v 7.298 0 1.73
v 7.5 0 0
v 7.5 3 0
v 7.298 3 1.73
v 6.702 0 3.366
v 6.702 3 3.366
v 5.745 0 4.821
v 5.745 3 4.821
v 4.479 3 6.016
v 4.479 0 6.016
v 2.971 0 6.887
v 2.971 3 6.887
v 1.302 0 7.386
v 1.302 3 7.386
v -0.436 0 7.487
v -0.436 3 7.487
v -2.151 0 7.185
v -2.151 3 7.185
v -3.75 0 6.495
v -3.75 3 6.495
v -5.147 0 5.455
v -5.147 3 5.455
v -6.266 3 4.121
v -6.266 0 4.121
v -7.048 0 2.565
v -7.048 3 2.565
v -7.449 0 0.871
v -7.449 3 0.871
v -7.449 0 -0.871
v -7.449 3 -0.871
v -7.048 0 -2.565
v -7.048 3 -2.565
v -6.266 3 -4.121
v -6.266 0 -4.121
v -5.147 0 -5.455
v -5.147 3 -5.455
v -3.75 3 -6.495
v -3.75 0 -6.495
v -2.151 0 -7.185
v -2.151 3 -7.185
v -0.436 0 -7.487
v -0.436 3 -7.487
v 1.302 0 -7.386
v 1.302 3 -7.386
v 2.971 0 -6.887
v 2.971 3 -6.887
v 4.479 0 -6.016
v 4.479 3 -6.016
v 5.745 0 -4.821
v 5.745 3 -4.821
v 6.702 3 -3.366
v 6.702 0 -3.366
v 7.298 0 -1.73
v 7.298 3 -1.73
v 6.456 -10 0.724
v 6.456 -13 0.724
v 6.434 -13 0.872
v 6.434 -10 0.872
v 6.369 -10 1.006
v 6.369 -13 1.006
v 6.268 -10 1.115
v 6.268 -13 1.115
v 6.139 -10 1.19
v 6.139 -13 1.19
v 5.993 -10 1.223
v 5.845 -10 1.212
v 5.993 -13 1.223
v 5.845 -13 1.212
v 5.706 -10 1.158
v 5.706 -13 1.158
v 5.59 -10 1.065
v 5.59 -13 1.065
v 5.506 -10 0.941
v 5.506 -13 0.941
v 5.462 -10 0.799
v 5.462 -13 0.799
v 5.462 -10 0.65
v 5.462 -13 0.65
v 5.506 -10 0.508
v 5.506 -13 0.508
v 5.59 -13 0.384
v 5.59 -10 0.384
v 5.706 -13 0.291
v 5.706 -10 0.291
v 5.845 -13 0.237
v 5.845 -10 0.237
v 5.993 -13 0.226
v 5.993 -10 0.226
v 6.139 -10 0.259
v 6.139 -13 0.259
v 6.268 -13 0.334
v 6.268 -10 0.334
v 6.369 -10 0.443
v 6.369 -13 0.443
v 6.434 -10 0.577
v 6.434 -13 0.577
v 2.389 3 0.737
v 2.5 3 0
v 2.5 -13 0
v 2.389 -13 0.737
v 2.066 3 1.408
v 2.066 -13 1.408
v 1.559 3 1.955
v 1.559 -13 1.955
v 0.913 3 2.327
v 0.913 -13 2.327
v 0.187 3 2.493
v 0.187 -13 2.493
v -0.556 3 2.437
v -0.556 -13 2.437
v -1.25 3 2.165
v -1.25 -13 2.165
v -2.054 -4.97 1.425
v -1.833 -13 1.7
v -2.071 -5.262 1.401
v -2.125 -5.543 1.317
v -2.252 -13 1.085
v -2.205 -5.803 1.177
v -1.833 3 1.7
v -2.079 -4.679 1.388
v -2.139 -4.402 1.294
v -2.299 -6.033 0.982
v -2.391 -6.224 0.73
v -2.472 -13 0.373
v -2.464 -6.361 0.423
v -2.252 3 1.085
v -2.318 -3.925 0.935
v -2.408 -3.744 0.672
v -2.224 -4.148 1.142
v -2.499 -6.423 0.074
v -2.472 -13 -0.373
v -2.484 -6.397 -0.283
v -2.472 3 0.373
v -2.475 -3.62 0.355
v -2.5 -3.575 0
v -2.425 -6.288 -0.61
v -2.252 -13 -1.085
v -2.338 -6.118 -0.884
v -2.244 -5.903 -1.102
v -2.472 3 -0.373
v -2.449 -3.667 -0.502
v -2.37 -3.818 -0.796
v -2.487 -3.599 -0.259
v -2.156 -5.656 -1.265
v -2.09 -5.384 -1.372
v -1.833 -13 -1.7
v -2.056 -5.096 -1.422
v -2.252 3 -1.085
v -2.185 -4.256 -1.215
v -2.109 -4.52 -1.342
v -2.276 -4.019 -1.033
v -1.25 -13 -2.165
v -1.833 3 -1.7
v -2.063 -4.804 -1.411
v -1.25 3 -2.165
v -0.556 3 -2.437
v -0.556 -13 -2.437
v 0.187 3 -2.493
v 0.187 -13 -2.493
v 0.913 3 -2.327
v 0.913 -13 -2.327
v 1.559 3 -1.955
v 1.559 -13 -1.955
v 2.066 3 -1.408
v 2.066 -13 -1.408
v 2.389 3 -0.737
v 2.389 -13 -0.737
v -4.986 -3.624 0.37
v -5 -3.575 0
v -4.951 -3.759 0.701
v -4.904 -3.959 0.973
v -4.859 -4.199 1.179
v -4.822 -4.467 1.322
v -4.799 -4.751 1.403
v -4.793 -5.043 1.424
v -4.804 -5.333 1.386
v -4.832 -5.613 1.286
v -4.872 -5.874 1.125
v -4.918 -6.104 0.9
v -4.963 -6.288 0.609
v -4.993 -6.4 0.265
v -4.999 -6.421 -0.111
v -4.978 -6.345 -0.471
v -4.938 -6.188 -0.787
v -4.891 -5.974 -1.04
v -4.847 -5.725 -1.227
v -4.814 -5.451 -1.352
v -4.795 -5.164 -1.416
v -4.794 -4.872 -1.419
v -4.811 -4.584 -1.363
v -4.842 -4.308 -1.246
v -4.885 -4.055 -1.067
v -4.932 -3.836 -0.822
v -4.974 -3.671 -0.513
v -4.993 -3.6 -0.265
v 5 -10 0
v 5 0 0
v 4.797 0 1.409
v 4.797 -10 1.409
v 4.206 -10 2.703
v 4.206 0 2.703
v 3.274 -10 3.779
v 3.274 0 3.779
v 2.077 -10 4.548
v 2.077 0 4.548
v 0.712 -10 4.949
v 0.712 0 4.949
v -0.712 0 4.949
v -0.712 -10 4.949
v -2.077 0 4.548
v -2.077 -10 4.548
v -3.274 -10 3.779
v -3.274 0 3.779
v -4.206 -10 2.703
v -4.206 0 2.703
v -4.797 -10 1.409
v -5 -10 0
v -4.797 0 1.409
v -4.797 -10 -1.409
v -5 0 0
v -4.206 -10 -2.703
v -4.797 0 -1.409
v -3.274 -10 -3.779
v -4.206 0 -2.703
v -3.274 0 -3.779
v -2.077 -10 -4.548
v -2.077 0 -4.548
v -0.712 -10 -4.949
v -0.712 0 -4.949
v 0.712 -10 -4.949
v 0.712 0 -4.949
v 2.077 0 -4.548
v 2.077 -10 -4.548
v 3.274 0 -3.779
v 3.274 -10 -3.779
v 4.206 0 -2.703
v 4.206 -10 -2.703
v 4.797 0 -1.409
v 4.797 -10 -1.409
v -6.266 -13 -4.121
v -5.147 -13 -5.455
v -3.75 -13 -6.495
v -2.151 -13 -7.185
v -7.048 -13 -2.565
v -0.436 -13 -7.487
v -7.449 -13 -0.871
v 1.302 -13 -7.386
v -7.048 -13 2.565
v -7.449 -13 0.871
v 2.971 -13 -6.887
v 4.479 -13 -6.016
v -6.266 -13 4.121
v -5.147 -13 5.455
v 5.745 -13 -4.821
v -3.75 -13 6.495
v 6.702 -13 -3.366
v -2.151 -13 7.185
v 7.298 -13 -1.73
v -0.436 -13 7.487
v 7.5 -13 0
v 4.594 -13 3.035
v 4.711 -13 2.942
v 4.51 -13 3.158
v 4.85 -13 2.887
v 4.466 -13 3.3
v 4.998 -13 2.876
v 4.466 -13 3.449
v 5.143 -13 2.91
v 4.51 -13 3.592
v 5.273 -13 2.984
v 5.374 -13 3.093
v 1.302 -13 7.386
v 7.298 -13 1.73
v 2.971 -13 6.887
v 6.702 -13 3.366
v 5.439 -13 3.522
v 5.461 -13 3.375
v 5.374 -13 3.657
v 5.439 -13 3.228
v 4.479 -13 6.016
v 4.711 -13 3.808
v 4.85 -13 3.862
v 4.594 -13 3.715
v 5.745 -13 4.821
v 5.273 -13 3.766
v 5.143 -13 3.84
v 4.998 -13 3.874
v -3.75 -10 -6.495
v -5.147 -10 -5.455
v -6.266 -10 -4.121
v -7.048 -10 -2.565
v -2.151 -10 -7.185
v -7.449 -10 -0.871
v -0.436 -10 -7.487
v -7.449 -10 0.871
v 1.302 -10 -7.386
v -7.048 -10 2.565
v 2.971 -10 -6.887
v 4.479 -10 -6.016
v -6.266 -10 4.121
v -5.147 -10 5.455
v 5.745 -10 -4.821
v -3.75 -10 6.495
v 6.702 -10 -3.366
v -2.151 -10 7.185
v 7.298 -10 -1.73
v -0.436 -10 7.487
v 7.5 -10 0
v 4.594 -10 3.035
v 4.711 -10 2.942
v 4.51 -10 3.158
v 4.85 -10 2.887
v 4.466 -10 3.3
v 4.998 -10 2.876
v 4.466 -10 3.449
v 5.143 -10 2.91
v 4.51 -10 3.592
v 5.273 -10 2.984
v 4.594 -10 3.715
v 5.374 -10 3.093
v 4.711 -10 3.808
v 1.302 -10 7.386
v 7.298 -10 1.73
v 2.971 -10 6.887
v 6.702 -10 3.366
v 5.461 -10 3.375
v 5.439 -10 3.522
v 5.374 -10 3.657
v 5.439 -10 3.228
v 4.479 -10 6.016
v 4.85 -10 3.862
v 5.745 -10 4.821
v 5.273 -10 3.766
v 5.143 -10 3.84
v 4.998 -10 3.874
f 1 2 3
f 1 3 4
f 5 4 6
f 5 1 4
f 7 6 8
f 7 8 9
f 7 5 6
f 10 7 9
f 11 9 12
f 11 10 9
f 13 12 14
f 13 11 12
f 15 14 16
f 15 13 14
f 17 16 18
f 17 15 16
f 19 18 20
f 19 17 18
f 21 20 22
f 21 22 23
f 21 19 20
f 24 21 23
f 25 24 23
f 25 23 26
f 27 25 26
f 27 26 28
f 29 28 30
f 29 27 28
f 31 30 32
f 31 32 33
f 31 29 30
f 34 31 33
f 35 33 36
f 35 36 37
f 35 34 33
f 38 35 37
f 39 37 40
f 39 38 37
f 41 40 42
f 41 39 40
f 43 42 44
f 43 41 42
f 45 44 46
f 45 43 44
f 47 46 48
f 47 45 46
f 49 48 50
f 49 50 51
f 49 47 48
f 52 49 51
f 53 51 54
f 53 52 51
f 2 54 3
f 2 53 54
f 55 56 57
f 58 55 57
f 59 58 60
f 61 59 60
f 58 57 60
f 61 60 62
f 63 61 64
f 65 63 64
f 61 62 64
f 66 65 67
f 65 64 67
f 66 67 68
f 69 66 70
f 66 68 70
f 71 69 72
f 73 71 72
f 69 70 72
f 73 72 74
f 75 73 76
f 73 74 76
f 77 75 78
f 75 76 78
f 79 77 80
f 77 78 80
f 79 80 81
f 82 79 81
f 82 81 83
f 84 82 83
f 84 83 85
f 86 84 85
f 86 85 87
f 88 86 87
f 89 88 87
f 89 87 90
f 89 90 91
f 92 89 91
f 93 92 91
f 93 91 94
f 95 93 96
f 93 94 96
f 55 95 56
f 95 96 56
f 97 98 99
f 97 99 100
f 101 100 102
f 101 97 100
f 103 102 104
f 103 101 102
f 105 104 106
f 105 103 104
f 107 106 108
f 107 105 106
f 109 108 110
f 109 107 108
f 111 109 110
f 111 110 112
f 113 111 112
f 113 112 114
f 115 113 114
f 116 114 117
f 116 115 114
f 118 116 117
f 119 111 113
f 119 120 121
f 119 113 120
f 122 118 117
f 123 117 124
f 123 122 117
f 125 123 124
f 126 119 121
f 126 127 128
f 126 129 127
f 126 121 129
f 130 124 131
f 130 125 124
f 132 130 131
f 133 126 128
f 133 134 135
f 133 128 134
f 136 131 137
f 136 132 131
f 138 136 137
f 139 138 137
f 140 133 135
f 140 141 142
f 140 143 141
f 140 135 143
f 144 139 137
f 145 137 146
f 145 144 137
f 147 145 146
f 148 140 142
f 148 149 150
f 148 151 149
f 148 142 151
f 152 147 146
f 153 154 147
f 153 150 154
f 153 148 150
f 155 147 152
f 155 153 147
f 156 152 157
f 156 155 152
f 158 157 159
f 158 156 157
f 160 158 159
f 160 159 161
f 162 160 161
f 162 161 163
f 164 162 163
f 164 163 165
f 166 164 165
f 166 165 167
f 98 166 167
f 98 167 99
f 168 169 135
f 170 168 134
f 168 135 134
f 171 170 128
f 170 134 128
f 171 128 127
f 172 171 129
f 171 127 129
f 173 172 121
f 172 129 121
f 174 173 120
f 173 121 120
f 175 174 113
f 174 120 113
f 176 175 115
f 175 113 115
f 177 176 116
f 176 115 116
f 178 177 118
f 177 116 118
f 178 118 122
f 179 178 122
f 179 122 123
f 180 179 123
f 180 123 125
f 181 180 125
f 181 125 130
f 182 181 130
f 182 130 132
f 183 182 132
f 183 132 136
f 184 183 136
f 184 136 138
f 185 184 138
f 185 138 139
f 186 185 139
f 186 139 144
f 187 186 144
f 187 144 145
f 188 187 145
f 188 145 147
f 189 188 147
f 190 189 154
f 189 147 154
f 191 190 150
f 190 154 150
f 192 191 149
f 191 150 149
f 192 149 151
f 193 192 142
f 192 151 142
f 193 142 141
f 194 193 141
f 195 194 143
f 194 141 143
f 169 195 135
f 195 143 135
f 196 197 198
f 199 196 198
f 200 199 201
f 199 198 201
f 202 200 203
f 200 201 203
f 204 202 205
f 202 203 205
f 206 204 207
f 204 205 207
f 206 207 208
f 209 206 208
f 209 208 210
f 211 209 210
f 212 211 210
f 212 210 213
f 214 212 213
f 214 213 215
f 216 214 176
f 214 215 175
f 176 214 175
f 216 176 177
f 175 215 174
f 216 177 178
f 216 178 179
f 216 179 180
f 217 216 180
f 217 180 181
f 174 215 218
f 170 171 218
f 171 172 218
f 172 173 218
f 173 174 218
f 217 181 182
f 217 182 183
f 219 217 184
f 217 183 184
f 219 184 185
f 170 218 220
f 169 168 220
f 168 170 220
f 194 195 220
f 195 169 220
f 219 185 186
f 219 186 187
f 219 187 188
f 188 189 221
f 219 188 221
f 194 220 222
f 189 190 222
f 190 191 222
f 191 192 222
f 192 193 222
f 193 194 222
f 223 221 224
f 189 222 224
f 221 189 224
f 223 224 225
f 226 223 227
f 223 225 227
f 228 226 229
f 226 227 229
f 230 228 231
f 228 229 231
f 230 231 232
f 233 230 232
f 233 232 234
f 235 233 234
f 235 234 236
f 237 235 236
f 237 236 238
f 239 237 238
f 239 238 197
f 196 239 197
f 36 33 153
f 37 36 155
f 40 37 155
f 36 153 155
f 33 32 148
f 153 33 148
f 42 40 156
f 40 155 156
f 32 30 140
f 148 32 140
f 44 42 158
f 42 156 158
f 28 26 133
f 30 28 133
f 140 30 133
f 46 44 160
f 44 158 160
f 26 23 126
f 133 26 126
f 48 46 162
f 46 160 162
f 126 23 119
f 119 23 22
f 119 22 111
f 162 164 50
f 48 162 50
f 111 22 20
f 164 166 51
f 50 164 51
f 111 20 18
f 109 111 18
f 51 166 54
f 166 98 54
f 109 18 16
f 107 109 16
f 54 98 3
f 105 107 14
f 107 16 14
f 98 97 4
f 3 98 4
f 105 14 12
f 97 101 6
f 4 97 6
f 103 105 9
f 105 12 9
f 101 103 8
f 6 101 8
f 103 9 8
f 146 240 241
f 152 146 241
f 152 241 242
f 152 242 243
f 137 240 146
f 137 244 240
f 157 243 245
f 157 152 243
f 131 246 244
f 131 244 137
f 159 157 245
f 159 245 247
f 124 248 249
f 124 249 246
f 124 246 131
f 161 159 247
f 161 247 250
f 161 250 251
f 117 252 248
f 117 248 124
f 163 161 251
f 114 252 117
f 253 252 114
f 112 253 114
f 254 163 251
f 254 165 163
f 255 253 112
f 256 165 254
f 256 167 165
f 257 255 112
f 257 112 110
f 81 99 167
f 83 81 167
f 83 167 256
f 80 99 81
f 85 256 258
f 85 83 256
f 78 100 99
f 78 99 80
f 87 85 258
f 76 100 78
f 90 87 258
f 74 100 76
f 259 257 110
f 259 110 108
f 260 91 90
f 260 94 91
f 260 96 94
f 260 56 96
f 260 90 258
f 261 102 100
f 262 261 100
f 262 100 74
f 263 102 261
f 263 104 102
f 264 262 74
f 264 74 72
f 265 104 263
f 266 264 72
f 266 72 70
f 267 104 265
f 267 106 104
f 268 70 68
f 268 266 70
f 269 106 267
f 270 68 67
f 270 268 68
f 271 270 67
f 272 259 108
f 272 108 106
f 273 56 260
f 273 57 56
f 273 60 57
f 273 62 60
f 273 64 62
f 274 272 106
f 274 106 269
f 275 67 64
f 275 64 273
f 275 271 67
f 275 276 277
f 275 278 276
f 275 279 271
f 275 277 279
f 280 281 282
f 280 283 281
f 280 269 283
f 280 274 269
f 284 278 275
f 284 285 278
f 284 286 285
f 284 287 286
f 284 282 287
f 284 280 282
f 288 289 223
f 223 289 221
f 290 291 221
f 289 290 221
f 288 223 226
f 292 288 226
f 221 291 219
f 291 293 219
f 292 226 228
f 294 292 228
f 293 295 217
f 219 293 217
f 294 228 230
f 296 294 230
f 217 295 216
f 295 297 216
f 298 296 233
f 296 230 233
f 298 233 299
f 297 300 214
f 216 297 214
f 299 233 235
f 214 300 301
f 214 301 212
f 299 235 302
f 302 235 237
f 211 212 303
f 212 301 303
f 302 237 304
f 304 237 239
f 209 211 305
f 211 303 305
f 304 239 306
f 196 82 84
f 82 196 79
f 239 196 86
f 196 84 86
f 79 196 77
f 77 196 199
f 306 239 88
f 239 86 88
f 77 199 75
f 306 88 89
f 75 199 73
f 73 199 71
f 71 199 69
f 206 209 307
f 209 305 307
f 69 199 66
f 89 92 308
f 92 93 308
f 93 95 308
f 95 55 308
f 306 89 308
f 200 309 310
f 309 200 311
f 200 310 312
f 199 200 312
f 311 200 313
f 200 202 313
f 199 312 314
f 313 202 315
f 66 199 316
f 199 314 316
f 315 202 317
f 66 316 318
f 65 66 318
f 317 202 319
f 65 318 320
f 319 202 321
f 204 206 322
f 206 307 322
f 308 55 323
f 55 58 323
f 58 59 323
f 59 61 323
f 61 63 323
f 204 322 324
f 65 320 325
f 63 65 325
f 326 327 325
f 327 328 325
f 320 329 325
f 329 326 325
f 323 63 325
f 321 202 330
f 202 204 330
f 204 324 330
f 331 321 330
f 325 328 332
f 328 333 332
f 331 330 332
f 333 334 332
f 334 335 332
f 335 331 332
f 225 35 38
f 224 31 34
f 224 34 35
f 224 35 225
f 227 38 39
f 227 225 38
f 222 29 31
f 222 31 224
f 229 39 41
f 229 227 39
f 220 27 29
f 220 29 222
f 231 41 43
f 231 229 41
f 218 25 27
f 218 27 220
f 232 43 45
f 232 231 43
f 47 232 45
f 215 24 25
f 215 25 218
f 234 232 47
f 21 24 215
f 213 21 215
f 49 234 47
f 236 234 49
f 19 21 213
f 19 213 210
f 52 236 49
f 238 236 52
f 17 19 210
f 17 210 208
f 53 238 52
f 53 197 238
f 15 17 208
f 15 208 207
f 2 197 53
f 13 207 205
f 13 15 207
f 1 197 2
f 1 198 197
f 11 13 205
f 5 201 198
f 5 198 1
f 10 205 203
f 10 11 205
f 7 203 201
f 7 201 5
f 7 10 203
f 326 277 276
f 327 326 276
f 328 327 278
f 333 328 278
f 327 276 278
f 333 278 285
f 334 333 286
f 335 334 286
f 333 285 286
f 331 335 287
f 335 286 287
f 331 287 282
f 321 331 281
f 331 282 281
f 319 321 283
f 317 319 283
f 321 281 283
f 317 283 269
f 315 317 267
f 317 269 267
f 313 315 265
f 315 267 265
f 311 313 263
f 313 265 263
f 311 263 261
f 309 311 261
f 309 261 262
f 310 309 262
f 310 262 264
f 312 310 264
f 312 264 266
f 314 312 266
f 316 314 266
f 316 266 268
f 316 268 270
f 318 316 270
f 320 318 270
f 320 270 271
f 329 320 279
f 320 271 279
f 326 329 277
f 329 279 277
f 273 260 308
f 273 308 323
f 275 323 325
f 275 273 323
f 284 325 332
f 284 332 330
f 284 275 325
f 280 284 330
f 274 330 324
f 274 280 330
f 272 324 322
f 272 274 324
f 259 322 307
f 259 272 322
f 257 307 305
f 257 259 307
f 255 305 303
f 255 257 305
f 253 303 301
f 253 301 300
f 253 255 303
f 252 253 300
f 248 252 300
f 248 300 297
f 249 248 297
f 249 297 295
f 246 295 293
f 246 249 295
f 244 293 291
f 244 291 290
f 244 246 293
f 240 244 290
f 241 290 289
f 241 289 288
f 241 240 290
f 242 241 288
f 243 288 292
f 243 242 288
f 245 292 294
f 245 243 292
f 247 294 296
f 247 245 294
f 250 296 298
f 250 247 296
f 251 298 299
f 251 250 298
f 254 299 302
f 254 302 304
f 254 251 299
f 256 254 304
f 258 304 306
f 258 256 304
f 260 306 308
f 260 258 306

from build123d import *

# Parameters (mm, degrees)
F0_R     = 5
F0_R_2   = 2.5
F1_DEPTH = 13
F0_R_3   = 7.5
F2_DEPTH = 3
F4_DEPTH = 3
F3_R     = 7.5
F3_R_2   = 5
F3_R_3   = 0.5
F5_DEPTH = 3
F6_R     = 1.425
F7_DEPTH = 25


with BuildPart() as f1:
    # F0 (on Front) → F1 (new body)
    with BuildSketch(Plane.XZ):
        Circle(F0_R)
        Circle(F0_R_2, mode=Mode.SUBTRACT)
    extrude(amount=F1_DEPTH)

    # F0 (on Front) → F2 (join)
    with BuildSketch(Plane.XZ):
        Circle(F0_R_3)
        Circle(F0_R, mode=Mode.SUBTRACT)
    extrude(amount=-F2_DEPTH)

    # F4 (add): a face of the model
    f4_faces = [f1.faces().sort_by_distance(p)[0] for p in [
        (-4.8585786438, 0, 0),
    ]]
    extrude(f4_faces, amount=F4_DEPTH)

    # F3 (on face) → F5 (join)
    with BuildSketch(Plane.XZ.offset(13)):
        Circle(F3_R)
        Circle(F3_R_2, mode=Mode.SUBTRACT)
        with Locations((5.9560983991, 0.7244942103)):
            Circle(F3_R_3, mode=Mode.SUBTRACT)
        with Locations((4.9608234595, 3.3749415703)):
            Circle(F3_R_3, mode=Mode.SUBTRACT)
    extrude(amount=-F5_DEPTH)

    # F6 (on Right) → F7 (cut)
    with BuildSketch(Plane.YZ):
        with Locations((-5, 0)):
            Circle(F6_R)
    extrude(amount=-F7_DEPTH, mode=Mode.SUBTRACT)


solid = f1.part
